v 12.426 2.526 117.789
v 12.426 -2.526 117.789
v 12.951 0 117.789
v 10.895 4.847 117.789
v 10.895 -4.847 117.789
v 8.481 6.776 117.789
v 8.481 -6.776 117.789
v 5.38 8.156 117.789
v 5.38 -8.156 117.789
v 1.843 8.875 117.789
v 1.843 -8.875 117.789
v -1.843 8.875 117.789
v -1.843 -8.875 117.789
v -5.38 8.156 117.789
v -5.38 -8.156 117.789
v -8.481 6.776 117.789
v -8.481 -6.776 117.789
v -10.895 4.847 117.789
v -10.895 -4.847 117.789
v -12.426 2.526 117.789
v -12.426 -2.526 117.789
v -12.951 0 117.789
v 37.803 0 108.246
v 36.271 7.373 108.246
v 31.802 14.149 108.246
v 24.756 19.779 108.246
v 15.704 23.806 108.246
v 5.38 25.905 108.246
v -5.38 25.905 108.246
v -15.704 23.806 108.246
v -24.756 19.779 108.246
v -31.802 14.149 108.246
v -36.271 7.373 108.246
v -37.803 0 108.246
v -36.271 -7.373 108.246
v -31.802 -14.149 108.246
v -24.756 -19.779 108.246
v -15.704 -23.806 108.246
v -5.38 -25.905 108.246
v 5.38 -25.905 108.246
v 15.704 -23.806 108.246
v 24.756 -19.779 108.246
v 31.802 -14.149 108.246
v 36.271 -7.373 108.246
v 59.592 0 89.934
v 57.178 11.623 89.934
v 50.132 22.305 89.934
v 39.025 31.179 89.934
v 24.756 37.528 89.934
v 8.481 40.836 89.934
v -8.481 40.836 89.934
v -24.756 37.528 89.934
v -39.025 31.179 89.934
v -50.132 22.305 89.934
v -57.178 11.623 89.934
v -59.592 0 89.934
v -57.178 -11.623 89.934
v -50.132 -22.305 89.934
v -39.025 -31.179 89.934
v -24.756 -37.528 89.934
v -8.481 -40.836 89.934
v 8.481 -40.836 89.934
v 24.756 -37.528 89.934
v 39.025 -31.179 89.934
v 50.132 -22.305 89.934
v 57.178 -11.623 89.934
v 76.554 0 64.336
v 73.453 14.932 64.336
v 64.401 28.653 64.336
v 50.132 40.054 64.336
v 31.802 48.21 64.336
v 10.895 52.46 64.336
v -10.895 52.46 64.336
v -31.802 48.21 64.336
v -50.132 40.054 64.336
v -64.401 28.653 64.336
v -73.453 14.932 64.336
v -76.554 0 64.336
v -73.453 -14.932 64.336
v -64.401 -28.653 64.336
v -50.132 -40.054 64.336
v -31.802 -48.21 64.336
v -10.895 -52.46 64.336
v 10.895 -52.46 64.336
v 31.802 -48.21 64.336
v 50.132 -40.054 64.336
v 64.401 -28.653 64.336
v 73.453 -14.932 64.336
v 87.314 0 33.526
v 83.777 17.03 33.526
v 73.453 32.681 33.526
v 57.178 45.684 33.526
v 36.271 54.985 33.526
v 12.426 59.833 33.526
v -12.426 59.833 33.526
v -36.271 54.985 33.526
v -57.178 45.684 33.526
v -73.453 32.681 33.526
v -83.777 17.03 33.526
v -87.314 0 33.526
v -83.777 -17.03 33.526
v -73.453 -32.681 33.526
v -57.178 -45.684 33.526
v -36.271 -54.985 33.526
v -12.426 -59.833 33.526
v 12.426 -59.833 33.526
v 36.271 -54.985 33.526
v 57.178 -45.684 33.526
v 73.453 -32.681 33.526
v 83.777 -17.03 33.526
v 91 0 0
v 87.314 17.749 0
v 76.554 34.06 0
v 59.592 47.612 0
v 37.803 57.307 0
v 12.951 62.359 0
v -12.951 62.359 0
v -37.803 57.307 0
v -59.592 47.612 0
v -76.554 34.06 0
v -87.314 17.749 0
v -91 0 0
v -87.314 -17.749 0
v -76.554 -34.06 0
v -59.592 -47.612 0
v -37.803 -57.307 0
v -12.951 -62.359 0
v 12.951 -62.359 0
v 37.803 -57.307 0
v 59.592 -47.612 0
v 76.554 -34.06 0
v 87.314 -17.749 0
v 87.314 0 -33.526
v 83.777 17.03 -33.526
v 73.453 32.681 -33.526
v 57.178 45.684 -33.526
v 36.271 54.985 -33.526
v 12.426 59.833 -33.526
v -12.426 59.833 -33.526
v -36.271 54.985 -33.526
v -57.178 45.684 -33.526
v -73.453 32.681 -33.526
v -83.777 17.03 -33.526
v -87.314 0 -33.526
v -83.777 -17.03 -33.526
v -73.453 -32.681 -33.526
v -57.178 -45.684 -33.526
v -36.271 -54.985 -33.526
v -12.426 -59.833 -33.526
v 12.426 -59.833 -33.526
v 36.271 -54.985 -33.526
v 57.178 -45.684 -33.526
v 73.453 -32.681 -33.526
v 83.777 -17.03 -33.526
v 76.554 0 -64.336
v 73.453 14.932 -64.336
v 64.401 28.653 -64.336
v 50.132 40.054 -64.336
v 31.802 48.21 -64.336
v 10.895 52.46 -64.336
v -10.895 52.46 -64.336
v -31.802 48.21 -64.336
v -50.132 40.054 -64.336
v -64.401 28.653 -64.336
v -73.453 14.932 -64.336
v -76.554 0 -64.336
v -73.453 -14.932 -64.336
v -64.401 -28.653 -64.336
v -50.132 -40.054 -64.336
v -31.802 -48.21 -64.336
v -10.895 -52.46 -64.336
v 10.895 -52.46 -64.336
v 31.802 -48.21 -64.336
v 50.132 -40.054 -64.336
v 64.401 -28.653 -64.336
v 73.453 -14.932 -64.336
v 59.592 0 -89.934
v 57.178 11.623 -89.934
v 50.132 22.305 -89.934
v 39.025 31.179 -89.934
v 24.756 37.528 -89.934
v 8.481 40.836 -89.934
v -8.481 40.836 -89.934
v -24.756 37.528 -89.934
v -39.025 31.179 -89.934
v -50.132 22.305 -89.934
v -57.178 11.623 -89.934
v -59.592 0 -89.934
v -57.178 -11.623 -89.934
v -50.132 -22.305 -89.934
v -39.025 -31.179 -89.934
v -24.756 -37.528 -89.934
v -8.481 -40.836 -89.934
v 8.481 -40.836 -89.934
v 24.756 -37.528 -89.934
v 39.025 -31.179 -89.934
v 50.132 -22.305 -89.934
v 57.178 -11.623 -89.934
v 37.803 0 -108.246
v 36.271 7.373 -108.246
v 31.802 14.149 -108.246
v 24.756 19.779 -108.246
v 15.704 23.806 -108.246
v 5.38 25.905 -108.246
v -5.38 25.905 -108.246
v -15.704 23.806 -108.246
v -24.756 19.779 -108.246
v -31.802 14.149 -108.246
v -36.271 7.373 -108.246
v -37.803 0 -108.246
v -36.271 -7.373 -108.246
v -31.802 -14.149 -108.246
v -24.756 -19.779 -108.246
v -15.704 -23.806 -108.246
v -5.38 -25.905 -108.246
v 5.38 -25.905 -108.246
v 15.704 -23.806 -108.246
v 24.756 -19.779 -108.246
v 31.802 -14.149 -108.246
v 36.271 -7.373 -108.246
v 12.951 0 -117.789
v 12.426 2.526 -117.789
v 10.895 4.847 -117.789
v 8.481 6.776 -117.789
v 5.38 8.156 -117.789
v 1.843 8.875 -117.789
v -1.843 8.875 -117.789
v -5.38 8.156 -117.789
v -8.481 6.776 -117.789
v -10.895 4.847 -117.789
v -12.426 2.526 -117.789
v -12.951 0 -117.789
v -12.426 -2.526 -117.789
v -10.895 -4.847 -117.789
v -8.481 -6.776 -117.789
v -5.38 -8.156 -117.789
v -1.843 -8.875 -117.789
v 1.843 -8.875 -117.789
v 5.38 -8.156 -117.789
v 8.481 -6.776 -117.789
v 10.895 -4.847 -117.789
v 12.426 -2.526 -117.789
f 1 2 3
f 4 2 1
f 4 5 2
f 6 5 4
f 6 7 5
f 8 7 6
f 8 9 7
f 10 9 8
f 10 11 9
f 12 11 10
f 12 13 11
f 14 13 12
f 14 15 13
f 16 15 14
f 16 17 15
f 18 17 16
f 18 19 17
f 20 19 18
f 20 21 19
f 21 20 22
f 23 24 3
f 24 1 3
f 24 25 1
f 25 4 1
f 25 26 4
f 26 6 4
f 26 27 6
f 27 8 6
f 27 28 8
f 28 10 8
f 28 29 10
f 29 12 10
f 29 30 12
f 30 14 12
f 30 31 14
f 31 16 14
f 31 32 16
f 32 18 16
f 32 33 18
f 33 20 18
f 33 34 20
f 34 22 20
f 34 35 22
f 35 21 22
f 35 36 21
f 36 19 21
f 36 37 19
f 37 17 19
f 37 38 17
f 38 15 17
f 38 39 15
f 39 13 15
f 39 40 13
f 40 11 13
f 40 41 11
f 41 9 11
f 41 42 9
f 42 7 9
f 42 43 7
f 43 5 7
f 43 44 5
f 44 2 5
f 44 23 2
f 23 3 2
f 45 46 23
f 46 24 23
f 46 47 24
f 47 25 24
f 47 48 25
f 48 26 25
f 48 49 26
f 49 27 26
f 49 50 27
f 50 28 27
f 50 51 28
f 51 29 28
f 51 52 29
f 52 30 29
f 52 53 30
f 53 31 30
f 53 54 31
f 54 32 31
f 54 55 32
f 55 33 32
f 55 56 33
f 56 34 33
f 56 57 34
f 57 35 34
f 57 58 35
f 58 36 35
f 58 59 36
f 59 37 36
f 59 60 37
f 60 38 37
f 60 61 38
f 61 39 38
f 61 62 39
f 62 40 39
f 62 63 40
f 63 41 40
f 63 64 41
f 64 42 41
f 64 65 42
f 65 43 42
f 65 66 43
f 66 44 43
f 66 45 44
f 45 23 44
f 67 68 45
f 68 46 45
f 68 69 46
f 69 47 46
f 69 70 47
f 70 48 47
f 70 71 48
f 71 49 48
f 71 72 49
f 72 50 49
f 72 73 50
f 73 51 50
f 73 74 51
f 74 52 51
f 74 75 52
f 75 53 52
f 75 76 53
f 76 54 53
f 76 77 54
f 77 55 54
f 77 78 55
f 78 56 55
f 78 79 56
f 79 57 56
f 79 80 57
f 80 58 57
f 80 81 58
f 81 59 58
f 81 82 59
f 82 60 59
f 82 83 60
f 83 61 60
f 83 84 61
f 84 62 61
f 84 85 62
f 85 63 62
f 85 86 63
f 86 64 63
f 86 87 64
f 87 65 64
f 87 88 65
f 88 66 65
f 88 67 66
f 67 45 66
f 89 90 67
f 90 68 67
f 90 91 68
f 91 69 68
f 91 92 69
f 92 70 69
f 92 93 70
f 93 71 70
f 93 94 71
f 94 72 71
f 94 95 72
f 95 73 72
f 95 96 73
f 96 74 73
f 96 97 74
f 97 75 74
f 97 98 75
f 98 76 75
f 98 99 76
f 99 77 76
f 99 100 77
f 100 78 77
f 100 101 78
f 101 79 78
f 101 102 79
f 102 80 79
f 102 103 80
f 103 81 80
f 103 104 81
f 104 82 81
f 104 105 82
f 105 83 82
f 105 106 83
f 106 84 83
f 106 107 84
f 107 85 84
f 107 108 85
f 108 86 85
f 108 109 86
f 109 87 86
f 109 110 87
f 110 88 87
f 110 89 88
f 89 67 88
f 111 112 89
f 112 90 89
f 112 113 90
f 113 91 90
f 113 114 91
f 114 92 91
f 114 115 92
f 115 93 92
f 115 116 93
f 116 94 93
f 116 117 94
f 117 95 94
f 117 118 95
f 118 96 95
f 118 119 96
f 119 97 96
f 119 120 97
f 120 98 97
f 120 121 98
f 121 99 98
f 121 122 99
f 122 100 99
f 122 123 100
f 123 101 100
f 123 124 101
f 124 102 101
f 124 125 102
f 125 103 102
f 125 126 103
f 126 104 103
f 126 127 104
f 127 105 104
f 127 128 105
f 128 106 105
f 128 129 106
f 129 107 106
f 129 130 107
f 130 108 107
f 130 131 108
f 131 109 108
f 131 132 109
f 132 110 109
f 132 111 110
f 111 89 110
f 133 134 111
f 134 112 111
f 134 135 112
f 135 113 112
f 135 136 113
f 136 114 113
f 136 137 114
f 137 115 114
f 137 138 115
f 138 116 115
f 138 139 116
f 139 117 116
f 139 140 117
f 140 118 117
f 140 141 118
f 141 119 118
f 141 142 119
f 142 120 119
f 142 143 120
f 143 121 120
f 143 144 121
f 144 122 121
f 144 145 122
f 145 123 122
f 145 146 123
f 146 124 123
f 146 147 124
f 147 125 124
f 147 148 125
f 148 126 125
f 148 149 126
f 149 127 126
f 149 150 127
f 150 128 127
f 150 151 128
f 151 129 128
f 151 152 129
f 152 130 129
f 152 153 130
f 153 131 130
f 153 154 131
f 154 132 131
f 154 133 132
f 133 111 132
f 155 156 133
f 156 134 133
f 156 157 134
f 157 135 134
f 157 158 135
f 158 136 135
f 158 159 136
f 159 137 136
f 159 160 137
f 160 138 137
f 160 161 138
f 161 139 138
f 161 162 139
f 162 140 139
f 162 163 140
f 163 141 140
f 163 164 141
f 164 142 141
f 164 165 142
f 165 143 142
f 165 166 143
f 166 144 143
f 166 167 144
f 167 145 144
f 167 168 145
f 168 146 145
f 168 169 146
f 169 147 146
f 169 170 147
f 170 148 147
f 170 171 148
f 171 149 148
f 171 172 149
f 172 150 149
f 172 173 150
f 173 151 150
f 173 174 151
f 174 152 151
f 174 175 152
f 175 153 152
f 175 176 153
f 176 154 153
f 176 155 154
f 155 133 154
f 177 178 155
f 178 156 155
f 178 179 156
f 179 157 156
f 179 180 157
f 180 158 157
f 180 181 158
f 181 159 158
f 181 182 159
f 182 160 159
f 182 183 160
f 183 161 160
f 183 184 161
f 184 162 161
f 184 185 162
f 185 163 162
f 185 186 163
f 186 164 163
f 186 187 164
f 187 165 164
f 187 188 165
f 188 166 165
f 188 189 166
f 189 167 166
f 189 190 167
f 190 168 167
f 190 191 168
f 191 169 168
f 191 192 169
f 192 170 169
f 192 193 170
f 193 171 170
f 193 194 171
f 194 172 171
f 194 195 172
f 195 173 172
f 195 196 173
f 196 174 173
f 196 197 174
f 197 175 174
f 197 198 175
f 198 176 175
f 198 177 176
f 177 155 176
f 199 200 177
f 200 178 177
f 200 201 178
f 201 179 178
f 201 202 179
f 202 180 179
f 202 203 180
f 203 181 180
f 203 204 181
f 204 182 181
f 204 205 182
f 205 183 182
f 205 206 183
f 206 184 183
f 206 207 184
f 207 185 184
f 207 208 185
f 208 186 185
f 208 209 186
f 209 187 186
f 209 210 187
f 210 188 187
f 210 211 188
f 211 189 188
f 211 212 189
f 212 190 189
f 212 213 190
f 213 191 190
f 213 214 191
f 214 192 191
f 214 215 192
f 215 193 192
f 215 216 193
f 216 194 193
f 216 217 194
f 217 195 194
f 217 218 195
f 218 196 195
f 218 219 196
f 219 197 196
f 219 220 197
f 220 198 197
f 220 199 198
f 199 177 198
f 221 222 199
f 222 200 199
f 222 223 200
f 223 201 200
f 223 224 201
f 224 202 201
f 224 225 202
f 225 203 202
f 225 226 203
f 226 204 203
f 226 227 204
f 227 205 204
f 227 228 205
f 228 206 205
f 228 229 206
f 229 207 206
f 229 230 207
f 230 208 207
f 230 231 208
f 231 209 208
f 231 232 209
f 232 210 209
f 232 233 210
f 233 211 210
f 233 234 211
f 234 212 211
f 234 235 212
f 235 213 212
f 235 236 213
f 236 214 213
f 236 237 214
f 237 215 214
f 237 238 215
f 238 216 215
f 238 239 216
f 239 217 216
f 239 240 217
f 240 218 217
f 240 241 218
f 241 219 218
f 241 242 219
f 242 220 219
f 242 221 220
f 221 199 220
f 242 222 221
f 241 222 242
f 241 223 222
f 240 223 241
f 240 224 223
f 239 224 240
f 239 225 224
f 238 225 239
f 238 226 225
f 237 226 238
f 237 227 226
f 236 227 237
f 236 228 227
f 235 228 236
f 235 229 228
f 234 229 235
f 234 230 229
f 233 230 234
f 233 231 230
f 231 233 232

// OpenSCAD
// Generated by SolidPython 1.0.1 on 2020-07-29 00:46:50


scale(v = [13, 9, 17]) {
	sphere(r = 7);
}
/***********************************************
*********      SolidPython code:      **********
************************************************
 
# import packages: SolidPython
from solid import *
from solid.utils import *
from itertools import chain, combinations, permutations


class Resize:

    def __init__(self, scad_file):
        self.scad_file = scad_file
        #self.scad_file = import_scad(scad_file)
        # cone/cylinder param:
        self.r1 = 0
        self.r2 = 0
        self.h = 0
        # rectangular prism param:
        self.w = 0
        self.l = 0
        # ellipse param:
        self.r = 0

    # import OpenScad code (file name corresponds to shape)


    # classify shape + parameters
    def assign(self, param1, param2, param3):
        if self.scad_file == 'cone.scad':
            self.r1 = param1
            self.r2 = param2
            self.h = param3
        elif self.scad_file == 'cylinder.scad':
            self.r1 = param1
            self.r2 = param2
            self.h = param3
        elif self.scad_file == 'rectangularPrism.scad':
            self.h = param1
            self.l = param2
            self.w = param3
        else:
            self.r = param1
            self.h = param2

    # resize parameters
    def iterate(self):
        x = range(3, 20, 2)
        i = 1
        if self.scad_file == 'cone.scad':
            tempList = list(permutations(x, 2))
            for temp in tempList:
                param1 = temp[0]
                param2 = temp[1]
                filepath = 'produced_scad_files/' + 'cone' + str(param1) + '_' + str(param2) + '_' + '.scad'
                scad_render_to_file(cylinder(h=param1, r1=param2, r2=0), filepath)

        elif self.scad_file == 'cylinder.scad':
            tempList = list(permutations(x, 3))
            for temp in tempList:
                param1 = temp[0]
                param2 = temp[1]
                filepath = 'produced_scad_files/' + 'cylinder' + str(param1) + '_' + str(param2) + '_' + '.scad'
                scad_render_to_file(cylinder(h=param1, r1=param2, r2=param2), filepath)

        elif self.scad_file == 'rectangularPrism.scad':
            tempList = list(permutations(x, 3))
            for temp in tempList:
                param1 = temp[0]
                param2 = temp[1]
                param3 = temp[2]
                filepath = 'produced_scad_files/' + 'rectangularPrism' + str(param1) + '_' + str(param2) + '_' + str(
                    param3) + '.scad'
                scad_render_to_file(cube(size=(param1, param2, param3)), filepath)

        elif self.scad_file == 'ellipse.scad':
            tempList = list(permutations(x, 4))
            for temp in tempList:
                param1 = temp[0]
                param2 = temp[1]
                param3 = temp[2]
                param4 = temp[3]
                filepath = 'produced_scad_files/' + 'ellipse' + str(param1) + '_' + str(param2) + '_' + str(param3) + '_' + str(param4) + '.scad'
                scad_render_to_file(scale([param1, param2, param3])(sphere(r=param4)), filepath)

    def render_to_scadfile(self):
        scad_render_to_file(scad, 'example.scad') 
 
************************************************/
